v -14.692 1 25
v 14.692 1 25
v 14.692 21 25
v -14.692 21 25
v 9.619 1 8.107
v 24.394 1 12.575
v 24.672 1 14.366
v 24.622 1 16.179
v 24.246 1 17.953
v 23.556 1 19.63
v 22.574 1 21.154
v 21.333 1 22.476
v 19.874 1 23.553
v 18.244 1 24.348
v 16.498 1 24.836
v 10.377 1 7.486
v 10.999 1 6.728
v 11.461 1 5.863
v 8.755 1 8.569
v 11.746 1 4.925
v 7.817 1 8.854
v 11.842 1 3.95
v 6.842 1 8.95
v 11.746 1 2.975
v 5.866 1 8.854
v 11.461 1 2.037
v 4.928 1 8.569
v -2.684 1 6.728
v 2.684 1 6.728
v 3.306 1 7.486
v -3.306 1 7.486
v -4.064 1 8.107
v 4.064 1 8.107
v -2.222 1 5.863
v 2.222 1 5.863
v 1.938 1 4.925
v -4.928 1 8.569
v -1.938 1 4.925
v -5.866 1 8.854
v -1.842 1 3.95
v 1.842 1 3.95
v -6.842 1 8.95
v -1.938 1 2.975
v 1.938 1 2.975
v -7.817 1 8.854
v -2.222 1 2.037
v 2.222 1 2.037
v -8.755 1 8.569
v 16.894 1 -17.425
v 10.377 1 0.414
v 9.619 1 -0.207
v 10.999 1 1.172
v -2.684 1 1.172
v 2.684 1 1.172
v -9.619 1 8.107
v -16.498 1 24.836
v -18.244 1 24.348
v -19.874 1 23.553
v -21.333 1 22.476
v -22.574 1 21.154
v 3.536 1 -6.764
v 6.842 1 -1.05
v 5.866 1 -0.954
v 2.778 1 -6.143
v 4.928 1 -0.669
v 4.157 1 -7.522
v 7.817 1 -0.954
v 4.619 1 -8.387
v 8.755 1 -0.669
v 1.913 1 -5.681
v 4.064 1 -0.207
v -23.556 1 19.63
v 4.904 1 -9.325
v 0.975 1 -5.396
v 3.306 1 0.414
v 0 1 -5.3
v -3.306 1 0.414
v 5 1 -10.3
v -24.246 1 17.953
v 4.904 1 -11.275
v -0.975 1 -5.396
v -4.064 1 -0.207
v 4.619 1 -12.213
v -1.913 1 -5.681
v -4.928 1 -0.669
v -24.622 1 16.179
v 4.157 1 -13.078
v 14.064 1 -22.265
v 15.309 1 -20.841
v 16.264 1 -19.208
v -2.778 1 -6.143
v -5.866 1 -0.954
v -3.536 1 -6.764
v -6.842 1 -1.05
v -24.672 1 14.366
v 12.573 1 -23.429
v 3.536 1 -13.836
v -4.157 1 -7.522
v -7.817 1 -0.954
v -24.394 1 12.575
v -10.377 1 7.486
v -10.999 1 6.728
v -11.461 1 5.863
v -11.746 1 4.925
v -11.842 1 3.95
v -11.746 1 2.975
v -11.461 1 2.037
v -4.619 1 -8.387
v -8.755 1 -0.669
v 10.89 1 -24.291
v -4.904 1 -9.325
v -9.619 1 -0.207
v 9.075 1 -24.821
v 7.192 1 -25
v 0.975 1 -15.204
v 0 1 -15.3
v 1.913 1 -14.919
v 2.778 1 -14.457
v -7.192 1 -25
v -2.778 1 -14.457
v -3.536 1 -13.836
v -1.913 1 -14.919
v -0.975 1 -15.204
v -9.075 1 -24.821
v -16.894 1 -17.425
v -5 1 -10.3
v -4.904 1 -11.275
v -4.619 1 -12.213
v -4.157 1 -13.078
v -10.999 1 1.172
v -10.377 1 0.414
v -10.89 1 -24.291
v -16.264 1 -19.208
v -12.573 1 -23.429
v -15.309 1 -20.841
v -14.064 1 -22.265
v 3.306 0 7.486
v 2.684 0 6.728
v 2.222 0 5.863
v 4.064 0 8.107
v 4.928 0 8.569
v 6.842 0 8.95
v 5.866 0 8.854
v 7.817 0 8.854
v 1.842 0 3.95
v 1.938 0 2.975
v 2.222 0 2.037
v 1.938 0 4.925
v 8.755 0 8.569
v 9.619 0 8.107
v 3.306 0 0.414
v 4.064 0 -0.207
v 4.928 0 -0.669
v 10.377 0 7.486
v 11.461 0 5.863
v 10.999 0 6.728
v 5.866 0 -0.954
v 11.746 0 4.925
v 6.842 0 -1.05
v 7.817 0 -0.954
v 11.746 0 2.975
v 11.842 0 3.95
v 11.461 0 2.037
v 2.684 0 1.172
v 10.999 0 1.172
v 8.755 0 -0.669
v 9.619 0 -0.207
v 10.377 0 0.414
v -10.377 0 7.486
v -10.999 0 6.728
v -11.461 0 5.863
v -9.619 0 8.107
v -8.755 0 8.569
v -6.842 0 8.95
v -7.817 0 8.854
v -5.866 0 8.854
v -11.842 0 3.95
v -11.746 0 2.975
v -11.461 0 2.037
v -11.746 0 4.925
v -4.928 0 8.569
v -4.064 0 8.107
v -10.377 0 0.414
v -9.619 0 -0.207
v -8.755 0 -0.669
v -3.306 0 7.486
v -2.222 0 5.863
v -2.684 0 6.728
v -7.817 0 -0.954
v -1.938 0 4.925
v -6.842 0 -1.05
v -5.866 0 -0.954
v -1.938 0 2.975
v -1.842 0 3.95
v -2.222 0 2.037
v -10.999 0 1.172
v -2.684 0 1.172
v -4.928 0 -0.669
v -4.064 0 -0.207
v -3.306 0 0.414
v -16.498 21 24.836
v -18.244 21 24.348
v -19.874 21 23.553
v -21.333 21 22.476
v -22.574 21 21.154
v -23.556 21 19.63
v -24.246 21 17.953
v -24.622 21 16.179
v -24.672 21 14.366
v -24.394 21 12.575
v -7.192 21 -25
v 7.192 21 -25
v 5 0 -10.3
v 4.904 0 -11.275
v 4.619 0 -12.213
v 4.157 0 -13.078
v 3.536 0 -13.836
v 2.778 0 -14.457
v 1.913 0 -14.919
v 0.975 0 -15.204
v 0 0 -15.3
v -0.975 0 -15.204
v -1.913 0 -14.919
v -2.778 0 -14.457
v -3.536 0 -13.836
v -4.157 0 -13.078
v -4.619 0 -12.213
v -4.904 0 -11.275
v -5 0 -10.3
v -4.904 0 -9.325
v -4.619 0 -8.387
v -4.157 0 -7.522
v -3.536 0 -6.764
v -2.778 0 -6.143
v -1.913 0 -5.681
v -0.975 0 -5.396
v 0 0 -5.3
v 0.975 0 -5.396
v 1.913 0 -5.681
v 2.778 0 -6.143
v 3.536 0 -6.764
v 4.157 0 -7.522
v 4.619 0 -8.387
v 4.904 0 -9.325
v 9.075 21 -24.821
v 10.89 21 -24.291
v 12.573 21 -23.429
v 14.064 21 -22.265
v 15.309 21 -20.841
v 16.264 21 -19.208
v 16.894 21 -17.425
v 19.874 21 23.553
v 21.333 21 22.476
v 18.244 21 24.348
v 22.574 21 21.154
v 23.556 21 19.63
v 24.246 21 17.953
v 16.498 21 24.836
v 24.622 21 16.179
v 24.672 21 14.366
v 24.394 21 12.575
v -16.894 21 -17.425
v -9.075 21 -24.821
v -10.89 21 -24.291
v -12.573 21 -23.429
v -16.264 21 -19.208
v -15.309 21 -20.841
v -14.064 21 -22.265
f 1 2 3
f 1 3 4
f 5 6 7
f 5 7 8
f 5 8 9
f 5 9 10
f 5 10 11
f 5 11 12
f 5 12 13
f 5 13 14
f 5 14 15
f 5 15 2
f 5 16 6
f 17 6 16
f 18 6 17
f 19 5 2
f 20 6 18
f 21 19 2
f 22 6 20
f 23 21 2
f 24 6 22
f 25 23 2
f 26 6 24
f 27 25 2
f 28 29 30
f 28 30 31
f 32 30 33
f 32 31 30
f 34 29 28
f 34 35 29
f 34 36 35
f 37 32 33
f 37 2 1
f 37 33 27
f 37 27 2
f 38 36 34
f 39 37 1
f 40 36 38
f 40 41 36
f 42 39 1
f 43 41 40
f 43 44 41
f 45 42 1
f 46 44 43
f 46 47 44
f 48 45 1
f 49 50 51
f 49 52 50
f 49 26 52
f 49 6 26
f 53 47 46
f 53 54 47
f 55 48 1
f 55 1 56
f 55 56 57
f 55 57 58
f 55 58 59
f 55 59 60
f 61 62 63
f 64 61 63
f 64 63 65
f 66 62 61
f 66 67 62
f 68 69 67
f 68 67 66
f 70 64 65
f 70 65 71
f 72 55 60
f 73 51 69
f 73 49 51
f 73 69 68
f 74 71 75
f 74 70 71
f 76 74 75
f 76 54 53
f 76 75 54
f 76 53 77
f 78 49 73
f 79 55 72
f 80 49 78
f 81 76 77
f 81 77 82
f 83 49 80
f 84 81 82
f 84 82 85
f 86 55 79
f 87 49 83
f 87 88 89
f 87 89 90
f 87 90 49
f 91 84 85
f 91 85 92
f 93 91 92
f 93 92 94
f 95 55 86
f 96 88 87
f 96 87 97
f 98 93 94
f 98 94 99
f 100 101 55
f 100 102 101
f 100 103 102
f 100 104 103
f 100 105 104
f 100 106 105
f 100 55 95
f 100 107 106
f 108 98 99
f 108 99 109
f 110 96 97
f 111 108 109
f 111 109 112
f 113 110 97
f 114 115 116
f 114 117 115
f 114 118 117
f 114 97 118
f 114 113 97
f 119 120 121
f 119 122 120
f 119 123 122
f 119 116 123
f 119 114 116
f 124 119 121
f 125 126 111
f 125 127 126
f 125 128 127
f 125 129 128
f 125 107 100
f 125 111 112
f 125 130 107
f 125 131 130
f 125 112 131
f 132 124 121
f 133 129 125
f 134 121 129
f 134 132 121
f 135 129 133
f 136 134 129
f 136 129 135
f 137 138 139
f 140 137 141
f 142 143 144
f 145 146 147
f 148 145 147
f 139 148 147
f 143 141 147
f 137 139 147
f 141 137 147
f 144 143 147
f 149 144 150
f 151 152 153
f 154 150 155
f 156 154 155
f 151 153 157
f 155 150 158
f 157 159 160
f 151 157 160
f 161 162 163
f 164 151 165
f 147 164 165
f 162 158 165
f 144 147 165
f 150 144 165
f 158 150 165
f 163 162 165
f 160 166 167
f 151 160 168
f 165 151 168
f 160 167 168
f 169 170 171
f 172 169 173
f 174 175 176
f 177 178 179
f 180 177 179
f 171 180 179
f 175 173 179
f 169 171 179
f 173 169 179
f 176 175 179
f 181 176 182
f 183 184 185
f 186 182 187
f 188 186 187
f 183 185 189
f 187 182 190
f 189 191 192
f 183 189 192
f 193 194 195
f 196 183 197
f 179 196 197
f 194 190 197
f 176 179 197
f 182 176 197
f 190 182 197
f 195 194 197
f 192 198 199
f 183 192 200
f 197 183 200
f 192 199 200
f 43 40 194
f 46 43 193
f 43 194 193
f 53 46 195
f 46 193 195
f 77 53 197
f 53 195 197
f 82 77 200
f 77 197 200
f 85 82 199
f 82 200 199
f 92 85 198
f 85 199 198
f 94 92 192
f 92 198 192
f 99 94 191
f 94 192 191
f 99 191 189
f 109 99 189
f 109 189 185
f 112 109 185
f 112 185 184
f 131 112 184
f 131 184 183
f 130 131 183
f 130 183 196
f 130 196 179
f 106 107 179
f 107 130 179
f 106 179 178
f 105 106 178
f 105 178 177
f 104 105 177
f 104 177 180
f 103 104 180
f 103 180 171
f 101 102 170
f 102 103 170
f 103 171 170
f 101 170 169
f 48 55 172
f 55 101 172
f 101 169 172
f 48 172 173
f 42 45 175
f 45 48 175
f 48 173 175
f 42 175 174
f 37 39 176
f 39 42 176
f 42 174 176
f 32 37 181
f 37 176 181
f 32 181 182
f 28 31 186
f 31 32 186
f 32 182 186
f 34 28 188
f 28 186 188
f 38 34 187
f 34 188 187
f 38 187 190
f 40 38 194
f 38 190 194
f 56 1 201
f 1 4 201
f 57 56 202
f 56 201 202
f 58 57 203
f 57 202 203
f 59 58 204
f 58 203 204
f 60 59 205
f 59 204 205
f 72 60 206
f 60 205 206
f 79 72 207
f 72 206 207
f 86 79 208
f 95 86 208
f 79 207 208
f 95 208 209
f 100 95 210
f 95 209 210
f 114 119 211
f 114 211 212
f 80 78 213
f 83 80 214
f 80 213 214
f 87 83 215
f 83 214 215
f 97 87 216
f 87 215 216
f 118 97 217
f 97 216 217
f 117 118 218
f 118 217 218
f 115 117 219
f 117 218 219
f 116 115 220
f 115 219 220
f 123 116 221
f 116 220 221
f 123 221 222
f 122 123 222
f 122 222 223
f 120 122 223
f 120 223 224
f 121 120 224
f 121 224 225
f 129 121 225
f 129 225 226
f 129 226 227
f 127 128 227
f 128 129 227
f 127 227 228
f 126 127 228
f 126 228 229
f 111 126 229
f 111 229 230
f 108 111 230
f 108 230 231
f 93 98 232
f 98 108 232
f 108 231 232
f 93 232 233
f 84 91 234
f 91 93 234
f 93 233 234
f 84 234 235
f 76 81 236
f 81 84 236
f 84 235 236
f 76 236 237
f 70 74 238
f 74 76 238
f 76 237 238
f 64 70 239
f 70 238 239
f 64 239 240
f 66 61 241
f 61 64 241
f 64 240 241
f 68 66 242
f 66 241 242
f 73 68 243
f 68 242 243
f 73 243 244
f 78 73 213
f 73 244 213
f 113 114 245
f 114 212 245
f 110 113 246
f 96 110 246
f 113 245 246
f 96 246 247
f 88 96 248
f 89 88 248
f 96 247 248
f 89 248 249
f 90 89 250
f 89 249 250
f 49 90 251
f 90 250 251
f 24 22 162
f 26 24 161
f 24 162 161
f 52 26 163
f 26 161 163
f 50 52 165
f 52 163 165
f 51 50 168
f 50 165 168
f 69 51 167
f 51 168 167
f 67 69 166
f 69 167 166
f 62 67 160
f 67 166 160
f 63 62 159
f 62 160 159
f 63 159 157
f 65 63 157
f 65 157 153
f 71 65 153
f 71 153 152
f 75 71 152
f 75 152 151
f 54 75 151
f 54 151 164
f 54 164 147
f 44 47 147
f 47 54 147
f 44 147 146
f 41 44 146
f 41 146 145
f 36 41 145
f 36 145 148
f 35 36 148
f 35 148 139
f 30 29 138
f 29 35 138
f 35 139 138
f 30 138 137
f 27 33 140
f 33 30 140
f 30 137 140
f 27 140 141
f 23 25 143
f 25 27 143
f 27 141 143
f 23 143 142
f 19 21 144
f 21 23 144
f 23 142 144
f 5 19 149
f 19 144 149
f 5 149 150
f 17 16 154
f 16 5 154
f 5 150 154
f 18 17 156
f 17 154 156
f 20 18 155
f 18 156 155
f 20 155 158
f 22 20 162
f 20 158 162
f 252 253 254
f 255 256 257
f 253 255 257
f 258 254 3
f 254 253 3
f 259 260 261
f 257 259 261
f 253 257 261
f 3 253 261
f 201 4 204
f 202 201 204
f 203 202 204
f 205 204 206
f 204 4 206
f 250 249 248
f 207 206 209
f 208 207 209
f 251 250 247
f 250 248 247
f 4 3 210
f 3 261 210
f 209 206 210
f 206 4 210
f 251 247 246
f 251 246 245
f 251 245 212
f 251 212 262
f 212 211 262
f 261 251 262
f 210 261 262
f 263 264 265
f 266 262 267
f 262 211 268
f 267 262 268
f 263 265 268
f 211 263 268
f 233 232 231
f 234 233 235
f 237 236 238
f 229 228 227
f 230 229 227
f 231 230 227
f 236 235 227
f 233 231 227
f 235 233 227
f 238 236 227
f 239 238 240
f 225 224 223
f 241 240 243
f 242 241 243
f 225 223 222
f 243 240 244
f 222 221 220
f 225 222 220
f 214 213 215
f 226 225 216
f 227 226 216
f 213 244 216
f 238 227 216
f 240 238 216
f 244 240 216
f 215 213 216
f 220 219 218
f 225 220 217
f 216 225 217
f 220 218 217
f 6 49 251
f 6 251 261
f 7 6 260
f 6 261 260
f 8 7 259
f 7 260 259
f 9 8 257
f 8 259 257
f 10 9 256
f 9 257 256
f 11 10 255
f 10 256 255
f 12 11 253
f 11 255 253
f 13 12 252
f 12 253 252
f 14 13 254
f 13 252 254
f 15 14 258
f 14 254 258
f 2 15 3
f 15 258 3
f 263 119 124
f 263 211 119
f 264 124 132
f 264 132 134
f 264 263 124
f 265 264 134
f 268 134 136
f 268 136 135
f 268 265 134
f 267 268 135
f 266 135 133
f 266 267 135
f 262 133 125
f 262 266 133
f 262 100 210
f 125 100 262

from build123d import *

# Parameters (mm, degrees)
FSHAPE1_DEPTH    = 20
FRSHAPE1_R       = 10
FPIN1ABASE_REACH = 42.935
SPIN1ABASE_R     = 5
FPIN1BBASE_REACH = 42.935
SPIN1BBASE_R     = 5
FPIN2BASE_REACH  = 42.935
SPIN2BASE_R      = 5


with BuildPart() as part:
    # SShape1 → FShape1 (new body)
    with BuildSketch(Plane(origin=(0, 1, 0), x_dir=(1, 0, 0), z_dir=(0, 1, 0))):
        Polygon((-15, 25), (15, 25), (27.5, -25), (-27.5, -25), align=None)
    extrude(amount=FSHAPE1_DEPTH)

    # FRShape1
    frshape1_edges = [part.edges().sort_by_distance(p)[0] for p in [
        (-15, 11, -25),
        (15, 11, -25),
        (27.5, 11, 25),
        (-27.5, 11, 25),
    ]]
    fillet(frshape1_edges, radius=FRSHAPE1_R)

    # SPin1aBase → FPin1aBase (add, up to next)
    with BuildSketch(Plane(origin=(0, 0, 0), x_dir=(1, 0, 0), z_dir=(0, 1, 0)), mode=Mode.PRIVATE) as fpin1abase_sk1:
        with Locations((6.84160069, -3.95)):
            Circle(SPIN1ABASE_R)
    fpin1abase_tool1 = extrude(fpin1abase_sk1.sketch, amount=FPIN1ABASE_REACH, mode=Mode.PRIVATE) - part.part
    add(fpin1abase_tool1.solids().sort_by_distance((6.841601, 0, 3.95))[0])

    # SPin1bBase → FPin1bBase (add, up to next)
    with BuildSketch(Plane(origin=(0, 0, 0), x_dir=(1, 0, 0), z_dir=(0, 1, 0)), mode=Mode.PRIVATE) as fpin1bbase_sk1:
        with Locations((-6.84160069, -3.95)):
            Circle(SPIN1BBASE_R)
    fpin1bbase_tool1 = extrude(fpin1bbase_sk1.sketch, amount=FPIN1BBASE_REACH, mode=Mode.PRIVATE) - part.part
    add(fpin1bbase_tool1.solids().sort_by_distance((-6.841601, 0, 3.95))[0])

    # SPin2Base → FPin2Base (add, up to next)
    with BuildSketch(Plane(origin=(0, 0, 0), x_dir=(1, 0, 0), z_dir=(0, 1, 0)), mode=Mode.PRIVATE) as fpin2base_sk1:
        with Locations((0, 10.3)):
            Circle(SPIN2BASE_R)
    fpin2base_tool1 = extrude(fpin2base_sk1.sketch, amount=FPIN2BASE_REACH, mode=Mode.PRIVATE) - part.part
    add(fpin2base_tool1.solids().sort_by_distance((0, 0, -10.3))[0])


solid = part.part
